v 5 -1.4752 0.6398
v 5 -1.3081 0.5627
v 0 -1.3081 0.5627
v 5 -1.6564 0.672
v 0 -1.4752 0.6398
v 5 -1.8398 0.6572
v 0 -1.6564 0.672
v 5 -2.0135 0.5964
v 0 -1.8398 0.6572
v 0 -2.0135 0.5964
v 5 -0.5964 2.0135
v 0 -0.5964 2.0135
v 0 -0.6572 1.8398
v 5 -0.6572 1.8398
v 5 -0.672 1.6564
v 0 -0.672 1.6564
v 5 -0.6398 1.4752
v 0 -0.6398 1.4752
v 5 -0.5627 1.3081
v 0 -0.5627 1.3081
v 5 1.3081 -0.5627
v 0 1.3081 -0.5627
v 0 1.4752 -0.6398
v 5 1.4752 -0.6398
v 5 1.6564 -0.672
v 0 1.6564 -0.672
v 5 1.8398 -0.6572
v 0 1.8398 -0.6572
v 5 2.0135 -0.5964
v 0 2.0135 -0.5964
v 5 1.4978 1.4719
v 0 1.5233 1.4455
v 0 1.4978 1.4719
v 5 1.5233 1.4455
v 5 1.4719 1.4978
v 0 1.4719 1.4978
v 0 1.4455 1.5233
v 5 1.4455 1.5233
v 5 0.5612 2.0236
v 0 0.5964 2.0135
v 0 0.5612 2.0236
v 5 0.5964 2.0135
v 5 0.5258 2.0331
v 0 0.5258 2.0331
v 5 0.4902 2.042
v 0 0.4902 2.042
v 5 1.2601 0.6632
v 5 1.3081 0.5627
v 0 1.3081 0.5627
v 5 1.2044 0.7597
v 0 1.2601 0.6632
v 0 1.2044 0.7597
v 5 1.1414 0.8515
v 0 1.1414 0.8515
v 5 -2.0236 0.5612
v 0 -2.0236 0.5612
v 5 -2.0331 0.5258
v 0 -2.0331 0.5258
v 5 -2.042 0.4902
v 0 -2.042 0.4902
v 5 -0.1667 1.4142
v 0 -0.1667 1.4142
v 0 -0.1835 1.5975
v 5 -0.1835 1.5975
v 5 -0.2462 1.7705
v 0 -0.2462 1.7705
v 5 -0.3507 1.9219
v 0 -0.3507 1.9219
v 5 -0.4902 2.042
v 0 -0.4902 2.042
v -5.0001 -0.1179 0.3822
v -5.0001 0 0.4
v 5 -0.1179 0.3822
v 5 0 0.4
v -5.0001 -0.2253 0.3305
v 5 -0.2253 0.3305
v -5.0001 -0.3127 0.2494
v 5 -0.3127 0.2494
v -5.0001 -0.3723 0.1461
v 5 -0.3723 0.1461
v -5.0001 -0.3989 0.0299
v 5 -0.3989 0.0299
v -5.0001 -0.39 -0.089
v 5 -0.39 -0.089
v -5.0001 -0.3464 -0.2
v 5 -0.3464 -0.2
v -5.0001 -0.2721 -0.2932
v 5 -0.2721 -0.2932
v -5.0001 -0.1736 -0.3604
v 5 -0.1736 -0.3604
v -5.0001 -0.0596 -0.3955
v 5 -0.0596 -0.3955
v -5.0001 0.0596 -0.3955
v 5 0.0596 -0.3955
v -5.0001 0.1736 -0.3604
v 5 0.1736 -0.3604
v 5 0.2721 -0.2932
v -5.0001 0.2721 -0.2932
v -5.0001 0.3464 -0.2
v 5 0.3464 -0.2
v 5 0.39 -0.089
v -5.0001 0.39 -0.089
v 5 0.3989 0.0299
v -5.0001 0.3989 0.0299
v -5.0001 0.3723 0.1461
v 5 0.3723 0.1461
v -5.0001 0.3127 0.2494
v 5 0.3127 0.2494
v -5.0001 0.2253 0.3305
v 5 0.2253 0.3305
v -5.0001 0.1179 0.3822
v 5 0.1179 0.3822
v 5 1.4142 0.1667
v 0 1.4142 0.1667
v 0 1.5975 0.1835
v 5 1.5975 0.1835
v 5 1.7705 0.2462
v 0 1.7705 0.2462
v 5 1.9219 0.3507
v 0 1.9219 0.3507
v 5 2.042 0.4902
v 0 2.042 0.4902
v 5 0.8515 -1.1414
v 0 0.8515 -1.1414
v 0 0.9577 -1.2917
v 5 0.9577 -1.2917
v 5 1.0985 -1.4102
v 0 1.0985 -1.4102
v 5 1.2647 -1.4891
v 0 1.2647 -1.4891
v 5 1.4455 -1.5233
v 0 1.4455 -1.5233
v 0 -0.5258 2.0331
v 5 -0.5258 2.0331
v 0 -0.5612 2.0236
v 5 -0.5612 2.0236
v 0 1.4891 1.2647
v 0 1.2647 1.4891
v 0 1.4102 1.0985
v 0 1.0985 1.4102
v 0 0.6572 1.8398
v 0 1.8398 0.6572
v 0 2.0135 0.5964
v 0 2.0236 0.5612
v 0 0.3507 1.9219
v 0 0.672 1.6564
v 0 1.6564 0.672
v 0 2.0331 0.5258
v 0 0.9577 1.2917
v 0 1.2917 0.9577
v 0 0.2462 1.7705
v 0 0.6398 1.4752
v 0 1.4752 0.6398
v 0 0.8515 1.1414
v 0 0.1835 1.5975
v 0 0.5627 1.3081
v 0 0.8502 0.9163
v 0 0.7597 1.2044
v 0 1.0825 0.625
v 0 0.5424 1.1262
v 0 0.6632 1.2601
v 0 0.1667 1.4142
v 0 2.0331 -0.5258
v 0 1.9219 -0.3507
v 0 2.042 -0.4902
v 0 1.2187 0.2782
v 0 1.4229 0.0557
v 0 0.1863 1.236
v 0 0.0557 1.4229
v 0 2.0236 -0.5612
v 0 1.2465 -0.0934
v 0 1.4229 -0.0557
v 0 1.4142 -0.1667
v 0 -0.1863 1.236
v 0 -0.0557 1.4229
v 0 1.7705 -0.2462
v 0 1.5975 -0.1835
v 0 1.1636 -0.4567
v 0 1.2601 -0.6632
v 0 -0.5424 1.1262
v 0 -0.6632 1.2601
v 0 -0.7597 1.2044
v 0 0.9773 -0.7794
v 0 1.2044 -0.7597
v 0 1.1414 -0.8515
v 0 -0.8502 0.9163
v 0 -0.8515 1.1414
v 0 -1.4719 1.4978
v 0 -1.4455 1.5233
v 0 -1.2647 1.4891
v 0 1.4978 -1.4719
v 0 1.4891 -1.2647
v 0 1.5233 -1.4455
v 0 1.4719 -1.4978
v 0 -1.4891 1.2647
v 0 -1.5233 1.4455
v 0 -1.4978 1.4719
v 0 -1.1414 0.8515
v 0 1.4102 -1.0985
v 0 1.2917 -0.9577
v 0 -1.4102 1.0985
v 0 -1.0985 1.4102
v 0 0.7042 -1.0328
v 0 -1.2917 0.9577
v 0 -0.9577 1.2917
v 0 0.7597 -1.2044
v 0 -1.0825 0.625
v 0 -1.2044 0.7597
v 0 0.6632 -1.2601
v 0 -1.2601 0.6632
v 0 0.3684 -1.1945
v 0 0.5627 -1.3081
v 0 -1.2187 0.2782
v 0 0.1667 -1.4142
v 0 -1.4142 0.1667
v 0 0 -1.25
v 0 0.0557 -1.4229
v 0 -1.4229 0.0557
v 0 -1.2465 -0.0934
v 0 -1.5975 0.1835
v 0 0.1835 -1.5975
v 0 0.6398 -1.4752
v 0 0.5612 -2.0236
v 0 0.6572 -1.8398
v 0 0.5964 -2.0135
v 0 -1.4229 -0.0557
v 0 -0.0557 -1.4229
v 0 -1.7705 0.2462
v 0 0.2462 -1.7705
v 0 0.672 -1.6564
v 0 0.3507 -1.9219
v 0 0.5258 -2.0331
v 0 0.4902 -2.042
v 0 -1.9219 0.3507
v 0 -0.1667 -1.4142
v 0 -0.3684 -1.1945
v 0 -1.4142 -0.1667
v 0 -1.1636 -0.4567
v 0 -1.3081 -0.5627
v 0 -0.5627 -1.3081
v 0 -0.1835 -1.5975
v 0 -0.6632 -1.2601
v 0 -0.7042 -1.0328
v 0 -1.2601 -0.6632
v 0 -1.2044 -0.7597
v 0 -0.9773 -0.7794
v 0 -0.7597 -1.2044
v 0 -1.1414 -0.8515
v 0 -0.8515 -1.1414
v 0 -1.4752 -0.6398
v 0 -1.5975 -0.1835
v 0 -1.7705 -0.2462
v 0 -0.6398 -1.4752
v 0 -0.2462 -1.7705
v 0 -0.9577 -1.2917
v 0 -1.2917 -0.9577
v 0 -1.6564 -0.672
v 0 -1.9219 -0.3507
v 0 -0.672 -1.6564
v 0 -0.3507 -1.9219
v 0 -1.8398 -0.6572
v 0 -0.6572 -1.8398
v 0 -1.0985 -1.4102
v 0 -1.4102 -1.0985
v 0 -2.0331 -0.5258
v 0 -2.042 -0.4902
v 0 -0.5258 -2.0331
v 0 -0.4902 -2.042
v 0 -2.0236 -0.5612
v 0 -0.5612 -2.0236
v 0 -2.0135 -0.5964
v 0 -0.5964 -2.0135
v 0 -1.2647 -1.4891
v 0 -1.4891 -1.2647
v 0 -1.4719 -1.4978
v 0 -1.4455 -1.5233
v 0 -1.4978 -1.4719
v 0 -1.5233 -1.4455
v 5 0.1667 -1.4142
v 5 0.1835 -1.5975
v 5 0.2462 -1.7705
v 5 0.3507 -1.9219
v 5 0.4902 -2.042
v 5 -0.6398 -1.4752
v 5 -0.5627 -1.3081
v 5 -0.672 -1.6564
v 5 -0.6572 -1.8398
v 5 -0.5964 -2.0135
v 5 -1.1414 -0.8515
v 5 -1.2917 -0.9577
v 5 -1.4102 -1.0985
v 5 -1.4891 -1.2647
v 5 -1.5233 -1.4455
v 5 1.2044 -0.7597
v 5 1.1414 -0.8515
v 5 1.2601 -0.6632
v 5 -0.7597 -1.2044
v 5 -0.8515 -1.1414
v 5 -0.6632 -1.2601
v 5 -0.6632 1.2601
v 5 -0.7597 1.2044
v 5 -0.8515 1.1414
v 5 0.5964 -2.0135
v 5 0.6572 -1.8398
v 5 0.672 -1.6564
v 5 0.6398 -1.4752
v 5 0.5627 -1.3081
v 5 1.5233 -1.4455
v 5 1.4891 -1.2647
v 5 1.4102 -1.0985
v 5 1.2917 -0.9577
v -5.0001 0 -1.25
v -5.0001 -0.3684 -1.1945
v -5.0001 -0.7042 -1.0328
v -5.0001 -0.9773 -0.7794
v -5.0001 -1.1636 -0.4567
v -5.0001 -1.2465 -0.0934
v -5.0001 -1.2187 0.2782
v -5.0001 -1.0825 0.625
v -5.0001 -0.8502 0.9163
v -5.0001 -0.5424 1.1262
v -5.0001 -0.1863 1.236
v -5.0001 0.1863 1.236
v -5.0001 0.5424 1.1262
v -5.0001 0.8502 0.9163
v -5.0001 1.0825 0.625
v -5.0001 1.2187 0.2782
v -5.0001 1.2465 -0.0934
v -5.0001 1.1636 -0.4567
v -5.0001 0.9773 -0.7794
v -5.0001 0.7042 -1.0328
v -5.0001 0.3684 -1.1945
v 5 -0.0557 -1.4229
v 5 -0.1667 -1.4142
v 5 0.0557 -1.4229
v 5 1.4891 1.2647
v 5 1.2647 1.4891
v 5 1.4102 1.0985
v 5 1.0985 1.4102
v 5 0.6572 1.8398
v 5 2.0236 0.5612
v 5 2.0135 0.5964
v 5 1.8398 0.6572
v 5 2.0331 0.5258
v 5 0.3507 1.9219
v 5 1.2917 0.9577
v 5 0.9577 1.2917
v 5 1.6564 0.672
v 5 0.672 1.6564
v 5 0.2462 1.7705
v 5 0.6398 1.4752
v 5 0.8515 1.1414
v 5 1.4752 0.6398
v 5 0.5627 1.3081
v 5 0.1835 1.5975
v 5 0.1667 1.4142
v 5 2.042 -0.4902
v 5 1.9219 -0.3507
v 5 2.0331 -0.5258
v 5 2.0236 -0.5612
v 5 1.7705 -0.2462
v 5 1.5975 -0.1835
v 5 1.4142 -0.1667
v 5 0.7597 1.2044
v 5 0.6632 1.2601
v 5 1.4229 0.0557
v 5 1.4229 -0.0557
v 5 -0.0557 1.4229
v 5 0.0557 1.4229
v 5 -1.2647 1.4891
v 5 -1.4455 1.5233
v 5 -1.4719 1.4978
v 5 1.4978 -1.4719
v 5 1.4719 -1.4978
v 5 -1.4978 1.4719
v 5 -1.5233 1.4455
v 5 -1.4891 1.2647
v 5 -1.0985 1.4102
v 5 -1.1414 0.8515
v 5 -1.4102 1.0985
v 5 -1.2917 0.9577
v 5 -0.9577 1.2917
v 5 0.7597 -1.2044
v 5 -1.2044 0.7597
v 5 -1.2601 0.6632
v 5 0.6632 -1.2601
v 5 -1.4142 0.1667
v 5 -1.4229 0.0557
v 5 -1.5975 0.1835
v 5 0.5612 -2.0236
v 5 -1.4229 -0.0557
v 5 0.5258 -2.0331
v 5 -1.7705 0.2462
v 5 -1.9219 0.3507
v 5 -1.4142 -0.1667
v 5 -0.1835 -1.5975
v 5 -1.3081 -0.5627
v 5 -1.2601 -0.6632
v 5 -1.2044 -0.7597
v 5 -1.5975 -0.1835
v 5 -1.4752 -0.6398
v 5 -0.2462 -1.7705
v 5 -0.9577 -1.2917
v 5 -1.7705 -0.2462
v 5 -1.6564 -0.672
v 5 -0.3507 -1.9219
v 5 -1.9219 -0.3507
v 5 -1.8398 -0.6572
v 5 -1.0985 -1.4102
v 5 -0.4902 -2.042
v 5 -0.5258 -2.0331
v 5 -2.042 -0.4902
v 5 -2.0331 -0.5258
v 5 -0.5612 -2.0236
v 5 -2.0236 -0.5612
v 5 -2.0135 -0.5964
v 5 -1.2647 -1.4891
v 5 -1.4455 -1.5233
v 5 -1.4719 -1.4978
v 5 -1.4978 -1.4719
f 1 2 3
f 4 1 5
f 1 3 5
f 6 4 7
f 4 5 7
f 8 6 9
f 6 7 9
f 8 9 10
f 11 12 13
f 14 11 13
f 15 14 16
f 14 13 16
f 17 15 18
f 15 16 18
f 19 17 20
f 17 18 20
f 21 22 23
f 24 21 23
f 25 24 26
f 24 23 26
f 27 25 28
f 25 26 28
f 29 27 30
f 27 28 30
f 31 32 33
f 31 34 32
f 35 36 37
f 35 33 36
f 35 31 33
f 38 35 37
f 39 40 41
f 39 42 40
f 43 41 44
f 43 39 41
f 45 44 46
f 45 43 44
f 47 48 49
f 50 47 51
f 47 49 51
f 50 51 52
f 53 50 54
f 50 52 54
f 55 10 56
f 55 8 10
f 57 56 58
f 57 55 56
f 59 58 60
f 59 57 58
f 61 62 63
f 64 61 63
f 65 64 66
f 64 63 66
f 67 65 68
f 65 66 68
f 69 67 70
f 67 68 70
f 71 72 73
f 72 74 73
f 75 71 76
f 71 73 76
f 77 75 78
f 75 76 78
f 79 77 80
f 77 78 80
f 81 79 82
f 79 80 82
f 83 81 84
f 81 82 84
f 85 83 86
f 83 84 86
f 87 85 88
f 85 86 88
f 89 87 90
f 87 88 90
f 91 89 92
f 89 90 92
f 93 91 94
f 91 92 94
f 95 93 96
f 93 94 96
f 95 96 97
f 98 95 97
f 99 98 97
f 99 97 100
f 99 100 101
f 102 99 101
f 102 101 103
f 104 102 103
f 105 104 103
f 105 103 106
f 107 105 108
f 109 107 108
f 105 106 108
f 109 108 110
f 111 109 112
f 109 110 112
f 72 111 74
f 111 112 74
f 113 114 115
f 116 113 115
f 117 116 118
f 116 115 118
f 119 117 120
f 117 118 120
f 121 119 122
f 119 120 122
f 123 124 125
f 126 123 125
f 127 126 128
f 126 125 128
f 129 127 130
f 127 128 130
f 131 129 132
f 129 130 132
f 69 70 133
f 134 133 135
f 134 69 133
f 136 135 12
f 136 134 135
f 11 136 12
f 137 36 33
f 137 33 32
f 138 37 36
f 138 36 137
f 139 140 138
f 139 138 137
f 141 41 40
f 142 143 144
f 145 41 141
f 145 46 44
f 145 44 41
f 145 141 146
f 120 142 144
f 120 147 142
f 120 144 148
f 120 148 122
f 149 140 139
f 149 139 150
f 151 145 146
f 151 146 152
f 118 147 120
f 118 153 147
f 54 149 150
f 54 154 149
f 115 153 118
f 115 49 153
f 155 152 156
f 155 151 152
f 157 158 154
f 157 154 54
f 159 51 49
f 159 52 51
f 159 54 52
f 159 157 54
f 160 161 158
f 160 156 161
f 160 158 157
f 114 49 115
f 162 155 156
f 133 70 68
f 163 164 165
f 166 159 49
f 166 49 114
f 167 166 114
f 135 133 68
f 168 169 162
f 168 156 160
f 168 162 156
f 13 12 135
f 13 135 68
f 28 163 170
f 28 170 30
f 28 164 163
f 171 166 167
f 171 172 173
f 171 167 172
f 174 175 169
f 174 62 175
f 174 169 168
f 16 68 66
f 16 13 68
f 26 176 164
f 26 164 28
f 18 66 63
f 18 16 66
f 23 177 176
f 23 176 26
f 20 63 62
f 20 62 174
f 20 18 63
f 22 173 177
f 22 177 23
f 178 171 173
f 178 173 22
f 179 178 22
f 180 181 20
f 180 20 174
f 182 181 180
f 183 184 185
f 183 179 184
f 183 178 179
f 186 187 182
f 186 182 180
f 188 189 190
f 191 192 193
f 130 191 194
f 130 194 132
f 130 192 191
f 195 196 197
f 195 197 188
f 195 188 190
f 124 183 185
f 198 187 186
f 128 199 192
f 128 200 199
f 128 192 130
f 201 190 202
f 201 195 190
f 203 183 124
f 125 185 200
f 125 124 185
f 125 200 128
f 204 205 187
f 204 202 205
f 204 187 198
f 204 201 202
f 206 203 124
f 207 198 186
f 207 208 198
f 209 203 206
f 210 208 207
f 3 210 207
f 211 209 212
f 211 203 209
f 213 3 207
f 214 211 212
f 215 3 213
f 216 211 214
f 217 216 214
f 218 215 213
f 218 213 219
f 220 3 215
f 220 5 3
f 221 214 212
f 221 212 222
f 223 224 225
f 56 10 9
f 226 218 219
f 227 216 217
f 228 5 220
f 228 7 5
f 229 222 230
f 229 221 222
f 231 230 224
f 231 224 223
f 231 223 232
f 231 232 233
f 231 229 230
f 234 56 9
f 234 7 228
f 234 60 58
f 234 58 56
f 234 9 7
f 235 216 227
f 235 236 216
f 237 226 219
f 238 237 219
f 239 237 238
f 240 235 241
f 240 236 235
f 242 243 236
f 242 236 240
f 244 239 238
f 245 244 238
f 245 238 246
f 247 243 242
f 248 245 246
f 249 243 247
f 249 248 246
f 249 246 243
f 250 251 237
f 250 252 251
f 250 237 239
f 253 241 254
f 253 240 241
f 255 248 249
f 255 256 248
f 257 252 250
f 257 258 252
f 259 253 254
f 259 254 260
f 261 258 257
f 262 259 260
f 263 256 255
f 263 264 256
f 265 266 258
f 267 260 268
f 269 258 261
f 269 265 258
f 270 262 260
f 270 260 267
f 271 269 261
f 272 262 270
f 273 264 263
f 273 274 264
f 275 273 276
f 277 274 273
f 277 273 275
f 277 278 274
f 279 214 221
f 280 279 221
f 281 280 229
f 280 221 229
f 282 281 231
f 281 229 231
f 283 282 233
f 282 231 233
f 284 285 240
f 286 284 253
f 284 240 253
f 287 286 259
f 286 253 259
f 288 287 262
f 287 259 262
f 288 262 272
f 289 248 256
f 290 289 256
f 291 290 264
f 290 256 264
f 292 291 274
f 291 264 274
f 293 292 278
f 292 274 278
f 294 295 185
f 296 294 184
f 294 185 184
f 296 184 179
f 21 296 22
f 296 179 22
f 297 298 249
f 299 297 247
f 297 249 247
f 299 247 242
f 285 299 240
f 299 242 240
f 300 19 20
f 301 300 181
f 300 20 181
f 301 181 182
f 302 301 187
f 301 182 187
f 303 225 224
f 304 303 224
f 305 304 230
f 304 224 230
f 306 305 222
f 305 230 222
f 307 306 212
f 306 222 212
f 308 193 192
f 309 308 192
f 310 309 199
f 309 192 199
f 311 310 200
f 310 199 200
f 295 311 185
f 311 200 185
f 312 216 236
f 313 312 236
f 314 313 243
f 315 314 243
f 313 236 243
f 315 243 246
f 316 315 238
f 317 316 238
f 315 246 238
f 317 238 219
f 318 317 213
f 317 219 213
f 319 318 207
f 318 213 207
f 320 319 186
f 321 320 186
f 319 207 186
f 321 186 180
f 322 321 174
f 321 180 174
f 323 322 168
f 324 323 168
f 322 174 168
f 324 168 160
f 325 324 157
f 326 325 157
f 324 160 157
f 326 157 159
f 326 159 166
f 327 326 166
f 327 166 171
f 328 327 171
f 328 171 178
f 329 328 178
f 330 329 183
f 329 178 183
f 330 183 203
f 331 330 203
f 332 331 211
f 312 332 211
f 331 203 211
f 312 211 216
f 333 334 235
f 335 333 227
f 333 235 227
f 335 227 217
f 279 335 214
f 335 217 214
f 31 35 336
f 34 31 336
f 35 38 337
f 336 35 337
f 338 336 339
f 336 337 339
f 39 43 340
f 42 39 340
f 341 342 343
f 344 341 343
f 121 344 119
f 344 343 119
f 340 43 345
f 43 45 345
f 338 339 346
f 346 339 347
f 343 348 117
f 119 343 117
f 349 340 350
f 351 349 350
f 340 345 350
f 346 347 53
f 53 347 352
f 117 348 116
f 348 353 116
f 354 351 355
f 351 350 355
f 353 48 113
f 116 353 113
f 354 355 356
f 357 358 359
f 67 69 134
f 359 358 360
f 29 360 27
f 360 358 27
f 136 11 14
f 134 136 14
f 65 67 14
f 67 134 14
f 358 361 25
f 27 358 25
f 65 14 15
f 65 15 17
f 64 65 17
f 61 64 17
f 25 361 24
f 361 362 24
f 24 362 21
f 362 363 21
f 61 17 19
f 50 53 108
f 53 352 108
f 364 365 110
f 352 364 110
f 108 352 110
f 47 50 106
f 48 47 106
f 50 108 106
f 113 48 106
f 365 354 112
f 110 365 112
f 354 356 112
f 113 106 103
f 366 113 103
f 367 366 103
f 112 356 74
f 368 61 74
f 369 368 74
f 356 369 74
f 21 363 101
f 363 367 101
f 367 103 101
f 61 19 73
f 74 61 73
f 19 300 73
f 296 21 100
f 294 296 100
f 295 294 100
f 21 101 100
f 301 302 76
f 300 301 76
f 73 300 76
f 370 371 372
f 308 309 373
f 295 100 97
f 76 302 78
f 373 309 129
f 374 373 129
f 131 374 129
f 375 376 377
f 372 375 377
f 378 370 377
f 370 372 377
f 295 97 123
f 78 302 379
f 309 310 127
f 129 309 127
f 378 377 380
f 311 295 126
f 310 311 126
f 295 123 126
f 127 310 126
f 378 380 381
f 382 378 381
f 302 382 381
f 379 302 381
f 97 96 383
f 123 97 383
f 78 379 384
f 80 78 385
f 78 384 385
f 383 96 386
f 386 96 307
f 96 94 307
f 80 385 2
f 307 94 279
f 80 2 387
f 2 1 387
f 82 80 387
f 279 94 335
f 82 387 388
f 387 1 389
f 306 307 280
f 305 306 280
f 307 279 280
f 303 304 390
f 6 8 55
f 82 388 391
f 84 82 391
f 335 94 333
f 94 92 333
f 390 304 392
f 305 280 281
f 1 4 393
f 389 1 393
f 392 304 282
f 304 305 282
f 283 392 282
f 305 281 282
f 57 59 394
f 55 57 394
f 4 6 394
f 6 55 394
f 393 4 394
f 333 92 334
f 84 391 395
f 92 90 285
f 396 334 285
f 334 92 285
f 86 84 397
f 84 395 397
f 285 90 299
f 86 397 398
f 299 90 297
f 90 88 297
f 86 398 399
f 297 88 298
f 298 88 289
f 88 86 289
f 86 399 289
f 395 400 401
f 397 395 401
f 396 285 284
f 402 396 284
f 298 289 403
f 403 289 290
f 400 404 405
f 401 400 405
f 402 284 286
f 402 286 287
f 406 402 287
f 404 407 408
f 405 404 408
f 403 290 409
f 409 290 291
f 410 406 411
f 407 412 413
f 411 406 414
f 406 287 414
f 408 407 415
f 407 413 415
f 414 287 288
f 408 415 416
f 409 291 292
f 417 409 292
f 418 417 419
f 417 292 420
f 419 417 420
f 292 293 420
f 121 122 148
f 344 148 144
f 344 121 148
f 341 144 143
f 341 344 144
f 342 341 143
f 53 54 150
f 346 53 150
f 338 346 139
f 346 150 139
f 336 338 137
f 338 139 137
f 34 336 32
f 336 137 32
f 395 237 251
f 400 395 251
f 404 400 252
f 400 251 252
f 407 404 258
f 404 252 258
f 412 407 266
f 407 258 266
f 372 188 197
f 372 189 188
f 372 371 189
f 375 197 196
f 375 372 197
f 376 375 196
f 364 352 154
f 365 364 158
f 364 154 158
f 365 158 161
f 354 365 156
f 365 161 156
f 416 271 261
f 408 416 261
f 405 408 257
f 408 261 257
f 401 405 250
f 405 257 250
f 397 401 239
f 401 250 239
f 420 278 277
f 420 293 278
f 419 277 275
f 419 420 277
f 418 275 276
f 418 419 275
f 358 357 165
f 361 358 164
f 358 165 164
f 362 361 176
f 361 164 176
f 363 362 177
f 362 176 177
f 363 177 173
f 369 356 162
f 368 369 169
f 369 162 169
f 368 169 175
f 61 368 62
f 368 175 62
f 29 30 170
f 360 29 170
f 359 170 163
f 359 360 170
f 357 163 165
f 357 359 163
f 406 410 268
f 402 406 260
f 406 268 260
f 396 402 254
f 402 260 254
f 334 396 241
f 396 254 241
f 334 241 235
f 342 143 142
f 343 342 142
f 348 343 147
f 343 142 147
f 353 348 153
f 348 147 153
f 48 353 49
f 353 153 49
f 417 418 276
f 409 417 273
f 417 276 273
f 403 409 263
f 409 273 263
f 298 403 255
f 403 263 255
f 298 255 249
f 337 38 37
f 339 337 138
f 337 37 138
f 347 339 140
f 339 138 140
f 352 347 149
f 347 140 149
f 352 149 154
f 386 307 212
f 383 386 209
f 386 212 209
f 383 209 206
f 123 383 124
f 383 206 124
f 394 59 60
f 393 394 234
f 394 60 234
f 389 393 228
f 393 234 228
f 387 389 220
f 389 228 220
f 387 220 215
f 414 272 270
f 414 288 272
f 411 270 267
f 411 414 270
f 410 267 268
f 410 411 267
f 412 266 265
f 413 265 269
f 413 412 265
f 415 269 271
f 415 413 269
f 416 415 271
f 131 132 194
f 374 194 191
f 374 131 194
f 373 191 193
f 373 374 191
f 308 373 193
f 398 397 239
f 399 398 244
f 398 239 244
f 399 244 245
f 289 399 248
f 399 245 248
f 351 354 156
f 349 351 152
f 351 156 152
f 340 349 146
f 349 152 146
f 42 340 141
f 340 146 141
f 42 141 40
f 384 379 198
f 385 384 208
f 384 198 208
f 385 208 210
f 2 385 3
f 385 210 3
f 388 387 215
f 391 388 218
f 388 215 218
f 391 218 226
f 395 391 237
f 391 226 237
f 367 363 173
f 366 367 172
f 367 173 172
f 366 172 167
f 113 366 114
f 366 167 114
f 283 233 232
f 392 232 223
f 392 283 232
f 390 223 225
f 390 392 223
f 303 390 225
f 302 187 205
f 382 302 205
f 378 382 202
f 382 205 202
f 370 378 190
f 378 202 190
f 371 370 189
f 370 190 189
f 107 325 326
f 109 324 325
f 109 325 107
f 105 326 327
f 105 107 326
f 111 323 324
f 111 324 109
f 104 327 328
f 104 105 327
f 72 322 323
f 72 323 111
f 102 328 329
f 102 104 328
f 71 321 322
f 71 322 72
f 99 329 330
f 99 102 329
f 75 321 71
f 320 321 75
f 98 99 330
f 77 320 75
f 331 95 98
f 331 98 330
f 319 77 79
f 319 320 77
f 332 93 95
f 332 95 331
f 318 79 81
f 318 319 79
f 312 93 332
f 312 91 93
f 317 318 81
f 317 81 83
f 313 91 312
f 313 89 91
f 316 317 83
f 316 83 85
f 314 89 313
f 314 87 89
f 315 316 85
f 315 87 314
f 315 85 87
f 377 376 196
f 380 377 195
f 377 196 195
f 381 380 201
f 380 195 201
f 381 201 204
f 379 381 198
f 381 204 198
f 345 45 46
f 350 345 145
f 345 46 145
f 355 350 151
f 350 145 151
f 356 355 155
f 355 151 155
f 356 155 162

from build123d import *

# Parameters (mm, degrees)
BASPROSKE_W      = 5
BASPROSKE_H      = 2.1
TOOTHCUT_DEPTH   = 6.815496539
TEETHCUTS_COUNT  = 12
TEETHCUTS_ANGLE  = 330
HUBNEAONESKE_R   = 1.25
HUBNEARONE_DEPTH = 5.0000508
BORSKE_R         = 0.4
BORE_DEPTH       = 10.0000508


with BuildPart() as part:
    # BasProSke → Base-Revolve (revolve)
    with BuildSketch(Plane(origin=(0, 0, 0), x_dir=(1, 0, 0), z_dir=(0, 1, 0)), mode=Mode.PRIVATE) as base_revolve_sk:
        with Locations((2.5, 1.05)):
            Rectangle(BASPROSKE_W, BASPROSKE_H)
    revolve(base_revolve_sk.sketch.rotate(Axis((-10, 0, 0), (1, 0, 0)), 180), axis=Axis((-10, 0, 0), (1, 0, 0)))

    # TooCutSke → ToothCut (cut, through all)
    with BuildSketch(Plane(origin=(0, 0, 0), x_dir=(0, 0, -1), z_dir=(1, 0, 0))):
        with BuildLine():
            ThreePointArc((0.16674814, 1.41420333), (0, 1.424), (-0.16674814, 1.41420333))
            ThreePointArc((-0.16674814, 1.41420333), (-0.254548019, 1.786124318), (-0.520302512, 2.060730564))
            ThreePointArc((-0.520302512, 2.060730564), (0, 2.1254), (0.520302512, 2.060730564))
            ThreePointArc((0.520302512, 2.060730564), (0.254548019, 1.786124318), (0.16674814, 1.41420333))
        make_face()
    toothcut = extrude(amount=TOOTHCUT_DEPTH, mode=Mode.SUBTRACT)

    # TeethCuts: ToothCut ×12 about axis
    teethcuts_axis = Axis((-10, 0, 0), (1, 0, 0))
    for i in range(1, TEETHCUTS_COUNT):
        add(toothcut.rotate(teethcuts_axis, i * TEETHCUTS_ANGLE / (TEETHCUTS_COUNT - 1)), mode=Mode.SUBTRACT)

    # HubNeaOneSke → HubNearOne (add)
    with BuildSketch(Plane.ZY):
        with Locations(Location((0, 0, 0), (0, 0, 180))):
            Circle(HUBNEAONESKE_R)
    extrude(amount=HUBNEARONE_DEPTH)

    # BorSke → Bore (cut, symmetric)
    with BuildSketch(Plane(origin=(0, 0, 0), x_dir=(0, 0, -1), z_dir=(1, 0, 0))):
        with Locations(Location((0, 0, 0), (0, 0, 180))):
            Circle(BORSKE_R)
    extrude(amount=BORE_DEPTH, both=True, mode=Mode.SUBTRACT)


solid = part.part
